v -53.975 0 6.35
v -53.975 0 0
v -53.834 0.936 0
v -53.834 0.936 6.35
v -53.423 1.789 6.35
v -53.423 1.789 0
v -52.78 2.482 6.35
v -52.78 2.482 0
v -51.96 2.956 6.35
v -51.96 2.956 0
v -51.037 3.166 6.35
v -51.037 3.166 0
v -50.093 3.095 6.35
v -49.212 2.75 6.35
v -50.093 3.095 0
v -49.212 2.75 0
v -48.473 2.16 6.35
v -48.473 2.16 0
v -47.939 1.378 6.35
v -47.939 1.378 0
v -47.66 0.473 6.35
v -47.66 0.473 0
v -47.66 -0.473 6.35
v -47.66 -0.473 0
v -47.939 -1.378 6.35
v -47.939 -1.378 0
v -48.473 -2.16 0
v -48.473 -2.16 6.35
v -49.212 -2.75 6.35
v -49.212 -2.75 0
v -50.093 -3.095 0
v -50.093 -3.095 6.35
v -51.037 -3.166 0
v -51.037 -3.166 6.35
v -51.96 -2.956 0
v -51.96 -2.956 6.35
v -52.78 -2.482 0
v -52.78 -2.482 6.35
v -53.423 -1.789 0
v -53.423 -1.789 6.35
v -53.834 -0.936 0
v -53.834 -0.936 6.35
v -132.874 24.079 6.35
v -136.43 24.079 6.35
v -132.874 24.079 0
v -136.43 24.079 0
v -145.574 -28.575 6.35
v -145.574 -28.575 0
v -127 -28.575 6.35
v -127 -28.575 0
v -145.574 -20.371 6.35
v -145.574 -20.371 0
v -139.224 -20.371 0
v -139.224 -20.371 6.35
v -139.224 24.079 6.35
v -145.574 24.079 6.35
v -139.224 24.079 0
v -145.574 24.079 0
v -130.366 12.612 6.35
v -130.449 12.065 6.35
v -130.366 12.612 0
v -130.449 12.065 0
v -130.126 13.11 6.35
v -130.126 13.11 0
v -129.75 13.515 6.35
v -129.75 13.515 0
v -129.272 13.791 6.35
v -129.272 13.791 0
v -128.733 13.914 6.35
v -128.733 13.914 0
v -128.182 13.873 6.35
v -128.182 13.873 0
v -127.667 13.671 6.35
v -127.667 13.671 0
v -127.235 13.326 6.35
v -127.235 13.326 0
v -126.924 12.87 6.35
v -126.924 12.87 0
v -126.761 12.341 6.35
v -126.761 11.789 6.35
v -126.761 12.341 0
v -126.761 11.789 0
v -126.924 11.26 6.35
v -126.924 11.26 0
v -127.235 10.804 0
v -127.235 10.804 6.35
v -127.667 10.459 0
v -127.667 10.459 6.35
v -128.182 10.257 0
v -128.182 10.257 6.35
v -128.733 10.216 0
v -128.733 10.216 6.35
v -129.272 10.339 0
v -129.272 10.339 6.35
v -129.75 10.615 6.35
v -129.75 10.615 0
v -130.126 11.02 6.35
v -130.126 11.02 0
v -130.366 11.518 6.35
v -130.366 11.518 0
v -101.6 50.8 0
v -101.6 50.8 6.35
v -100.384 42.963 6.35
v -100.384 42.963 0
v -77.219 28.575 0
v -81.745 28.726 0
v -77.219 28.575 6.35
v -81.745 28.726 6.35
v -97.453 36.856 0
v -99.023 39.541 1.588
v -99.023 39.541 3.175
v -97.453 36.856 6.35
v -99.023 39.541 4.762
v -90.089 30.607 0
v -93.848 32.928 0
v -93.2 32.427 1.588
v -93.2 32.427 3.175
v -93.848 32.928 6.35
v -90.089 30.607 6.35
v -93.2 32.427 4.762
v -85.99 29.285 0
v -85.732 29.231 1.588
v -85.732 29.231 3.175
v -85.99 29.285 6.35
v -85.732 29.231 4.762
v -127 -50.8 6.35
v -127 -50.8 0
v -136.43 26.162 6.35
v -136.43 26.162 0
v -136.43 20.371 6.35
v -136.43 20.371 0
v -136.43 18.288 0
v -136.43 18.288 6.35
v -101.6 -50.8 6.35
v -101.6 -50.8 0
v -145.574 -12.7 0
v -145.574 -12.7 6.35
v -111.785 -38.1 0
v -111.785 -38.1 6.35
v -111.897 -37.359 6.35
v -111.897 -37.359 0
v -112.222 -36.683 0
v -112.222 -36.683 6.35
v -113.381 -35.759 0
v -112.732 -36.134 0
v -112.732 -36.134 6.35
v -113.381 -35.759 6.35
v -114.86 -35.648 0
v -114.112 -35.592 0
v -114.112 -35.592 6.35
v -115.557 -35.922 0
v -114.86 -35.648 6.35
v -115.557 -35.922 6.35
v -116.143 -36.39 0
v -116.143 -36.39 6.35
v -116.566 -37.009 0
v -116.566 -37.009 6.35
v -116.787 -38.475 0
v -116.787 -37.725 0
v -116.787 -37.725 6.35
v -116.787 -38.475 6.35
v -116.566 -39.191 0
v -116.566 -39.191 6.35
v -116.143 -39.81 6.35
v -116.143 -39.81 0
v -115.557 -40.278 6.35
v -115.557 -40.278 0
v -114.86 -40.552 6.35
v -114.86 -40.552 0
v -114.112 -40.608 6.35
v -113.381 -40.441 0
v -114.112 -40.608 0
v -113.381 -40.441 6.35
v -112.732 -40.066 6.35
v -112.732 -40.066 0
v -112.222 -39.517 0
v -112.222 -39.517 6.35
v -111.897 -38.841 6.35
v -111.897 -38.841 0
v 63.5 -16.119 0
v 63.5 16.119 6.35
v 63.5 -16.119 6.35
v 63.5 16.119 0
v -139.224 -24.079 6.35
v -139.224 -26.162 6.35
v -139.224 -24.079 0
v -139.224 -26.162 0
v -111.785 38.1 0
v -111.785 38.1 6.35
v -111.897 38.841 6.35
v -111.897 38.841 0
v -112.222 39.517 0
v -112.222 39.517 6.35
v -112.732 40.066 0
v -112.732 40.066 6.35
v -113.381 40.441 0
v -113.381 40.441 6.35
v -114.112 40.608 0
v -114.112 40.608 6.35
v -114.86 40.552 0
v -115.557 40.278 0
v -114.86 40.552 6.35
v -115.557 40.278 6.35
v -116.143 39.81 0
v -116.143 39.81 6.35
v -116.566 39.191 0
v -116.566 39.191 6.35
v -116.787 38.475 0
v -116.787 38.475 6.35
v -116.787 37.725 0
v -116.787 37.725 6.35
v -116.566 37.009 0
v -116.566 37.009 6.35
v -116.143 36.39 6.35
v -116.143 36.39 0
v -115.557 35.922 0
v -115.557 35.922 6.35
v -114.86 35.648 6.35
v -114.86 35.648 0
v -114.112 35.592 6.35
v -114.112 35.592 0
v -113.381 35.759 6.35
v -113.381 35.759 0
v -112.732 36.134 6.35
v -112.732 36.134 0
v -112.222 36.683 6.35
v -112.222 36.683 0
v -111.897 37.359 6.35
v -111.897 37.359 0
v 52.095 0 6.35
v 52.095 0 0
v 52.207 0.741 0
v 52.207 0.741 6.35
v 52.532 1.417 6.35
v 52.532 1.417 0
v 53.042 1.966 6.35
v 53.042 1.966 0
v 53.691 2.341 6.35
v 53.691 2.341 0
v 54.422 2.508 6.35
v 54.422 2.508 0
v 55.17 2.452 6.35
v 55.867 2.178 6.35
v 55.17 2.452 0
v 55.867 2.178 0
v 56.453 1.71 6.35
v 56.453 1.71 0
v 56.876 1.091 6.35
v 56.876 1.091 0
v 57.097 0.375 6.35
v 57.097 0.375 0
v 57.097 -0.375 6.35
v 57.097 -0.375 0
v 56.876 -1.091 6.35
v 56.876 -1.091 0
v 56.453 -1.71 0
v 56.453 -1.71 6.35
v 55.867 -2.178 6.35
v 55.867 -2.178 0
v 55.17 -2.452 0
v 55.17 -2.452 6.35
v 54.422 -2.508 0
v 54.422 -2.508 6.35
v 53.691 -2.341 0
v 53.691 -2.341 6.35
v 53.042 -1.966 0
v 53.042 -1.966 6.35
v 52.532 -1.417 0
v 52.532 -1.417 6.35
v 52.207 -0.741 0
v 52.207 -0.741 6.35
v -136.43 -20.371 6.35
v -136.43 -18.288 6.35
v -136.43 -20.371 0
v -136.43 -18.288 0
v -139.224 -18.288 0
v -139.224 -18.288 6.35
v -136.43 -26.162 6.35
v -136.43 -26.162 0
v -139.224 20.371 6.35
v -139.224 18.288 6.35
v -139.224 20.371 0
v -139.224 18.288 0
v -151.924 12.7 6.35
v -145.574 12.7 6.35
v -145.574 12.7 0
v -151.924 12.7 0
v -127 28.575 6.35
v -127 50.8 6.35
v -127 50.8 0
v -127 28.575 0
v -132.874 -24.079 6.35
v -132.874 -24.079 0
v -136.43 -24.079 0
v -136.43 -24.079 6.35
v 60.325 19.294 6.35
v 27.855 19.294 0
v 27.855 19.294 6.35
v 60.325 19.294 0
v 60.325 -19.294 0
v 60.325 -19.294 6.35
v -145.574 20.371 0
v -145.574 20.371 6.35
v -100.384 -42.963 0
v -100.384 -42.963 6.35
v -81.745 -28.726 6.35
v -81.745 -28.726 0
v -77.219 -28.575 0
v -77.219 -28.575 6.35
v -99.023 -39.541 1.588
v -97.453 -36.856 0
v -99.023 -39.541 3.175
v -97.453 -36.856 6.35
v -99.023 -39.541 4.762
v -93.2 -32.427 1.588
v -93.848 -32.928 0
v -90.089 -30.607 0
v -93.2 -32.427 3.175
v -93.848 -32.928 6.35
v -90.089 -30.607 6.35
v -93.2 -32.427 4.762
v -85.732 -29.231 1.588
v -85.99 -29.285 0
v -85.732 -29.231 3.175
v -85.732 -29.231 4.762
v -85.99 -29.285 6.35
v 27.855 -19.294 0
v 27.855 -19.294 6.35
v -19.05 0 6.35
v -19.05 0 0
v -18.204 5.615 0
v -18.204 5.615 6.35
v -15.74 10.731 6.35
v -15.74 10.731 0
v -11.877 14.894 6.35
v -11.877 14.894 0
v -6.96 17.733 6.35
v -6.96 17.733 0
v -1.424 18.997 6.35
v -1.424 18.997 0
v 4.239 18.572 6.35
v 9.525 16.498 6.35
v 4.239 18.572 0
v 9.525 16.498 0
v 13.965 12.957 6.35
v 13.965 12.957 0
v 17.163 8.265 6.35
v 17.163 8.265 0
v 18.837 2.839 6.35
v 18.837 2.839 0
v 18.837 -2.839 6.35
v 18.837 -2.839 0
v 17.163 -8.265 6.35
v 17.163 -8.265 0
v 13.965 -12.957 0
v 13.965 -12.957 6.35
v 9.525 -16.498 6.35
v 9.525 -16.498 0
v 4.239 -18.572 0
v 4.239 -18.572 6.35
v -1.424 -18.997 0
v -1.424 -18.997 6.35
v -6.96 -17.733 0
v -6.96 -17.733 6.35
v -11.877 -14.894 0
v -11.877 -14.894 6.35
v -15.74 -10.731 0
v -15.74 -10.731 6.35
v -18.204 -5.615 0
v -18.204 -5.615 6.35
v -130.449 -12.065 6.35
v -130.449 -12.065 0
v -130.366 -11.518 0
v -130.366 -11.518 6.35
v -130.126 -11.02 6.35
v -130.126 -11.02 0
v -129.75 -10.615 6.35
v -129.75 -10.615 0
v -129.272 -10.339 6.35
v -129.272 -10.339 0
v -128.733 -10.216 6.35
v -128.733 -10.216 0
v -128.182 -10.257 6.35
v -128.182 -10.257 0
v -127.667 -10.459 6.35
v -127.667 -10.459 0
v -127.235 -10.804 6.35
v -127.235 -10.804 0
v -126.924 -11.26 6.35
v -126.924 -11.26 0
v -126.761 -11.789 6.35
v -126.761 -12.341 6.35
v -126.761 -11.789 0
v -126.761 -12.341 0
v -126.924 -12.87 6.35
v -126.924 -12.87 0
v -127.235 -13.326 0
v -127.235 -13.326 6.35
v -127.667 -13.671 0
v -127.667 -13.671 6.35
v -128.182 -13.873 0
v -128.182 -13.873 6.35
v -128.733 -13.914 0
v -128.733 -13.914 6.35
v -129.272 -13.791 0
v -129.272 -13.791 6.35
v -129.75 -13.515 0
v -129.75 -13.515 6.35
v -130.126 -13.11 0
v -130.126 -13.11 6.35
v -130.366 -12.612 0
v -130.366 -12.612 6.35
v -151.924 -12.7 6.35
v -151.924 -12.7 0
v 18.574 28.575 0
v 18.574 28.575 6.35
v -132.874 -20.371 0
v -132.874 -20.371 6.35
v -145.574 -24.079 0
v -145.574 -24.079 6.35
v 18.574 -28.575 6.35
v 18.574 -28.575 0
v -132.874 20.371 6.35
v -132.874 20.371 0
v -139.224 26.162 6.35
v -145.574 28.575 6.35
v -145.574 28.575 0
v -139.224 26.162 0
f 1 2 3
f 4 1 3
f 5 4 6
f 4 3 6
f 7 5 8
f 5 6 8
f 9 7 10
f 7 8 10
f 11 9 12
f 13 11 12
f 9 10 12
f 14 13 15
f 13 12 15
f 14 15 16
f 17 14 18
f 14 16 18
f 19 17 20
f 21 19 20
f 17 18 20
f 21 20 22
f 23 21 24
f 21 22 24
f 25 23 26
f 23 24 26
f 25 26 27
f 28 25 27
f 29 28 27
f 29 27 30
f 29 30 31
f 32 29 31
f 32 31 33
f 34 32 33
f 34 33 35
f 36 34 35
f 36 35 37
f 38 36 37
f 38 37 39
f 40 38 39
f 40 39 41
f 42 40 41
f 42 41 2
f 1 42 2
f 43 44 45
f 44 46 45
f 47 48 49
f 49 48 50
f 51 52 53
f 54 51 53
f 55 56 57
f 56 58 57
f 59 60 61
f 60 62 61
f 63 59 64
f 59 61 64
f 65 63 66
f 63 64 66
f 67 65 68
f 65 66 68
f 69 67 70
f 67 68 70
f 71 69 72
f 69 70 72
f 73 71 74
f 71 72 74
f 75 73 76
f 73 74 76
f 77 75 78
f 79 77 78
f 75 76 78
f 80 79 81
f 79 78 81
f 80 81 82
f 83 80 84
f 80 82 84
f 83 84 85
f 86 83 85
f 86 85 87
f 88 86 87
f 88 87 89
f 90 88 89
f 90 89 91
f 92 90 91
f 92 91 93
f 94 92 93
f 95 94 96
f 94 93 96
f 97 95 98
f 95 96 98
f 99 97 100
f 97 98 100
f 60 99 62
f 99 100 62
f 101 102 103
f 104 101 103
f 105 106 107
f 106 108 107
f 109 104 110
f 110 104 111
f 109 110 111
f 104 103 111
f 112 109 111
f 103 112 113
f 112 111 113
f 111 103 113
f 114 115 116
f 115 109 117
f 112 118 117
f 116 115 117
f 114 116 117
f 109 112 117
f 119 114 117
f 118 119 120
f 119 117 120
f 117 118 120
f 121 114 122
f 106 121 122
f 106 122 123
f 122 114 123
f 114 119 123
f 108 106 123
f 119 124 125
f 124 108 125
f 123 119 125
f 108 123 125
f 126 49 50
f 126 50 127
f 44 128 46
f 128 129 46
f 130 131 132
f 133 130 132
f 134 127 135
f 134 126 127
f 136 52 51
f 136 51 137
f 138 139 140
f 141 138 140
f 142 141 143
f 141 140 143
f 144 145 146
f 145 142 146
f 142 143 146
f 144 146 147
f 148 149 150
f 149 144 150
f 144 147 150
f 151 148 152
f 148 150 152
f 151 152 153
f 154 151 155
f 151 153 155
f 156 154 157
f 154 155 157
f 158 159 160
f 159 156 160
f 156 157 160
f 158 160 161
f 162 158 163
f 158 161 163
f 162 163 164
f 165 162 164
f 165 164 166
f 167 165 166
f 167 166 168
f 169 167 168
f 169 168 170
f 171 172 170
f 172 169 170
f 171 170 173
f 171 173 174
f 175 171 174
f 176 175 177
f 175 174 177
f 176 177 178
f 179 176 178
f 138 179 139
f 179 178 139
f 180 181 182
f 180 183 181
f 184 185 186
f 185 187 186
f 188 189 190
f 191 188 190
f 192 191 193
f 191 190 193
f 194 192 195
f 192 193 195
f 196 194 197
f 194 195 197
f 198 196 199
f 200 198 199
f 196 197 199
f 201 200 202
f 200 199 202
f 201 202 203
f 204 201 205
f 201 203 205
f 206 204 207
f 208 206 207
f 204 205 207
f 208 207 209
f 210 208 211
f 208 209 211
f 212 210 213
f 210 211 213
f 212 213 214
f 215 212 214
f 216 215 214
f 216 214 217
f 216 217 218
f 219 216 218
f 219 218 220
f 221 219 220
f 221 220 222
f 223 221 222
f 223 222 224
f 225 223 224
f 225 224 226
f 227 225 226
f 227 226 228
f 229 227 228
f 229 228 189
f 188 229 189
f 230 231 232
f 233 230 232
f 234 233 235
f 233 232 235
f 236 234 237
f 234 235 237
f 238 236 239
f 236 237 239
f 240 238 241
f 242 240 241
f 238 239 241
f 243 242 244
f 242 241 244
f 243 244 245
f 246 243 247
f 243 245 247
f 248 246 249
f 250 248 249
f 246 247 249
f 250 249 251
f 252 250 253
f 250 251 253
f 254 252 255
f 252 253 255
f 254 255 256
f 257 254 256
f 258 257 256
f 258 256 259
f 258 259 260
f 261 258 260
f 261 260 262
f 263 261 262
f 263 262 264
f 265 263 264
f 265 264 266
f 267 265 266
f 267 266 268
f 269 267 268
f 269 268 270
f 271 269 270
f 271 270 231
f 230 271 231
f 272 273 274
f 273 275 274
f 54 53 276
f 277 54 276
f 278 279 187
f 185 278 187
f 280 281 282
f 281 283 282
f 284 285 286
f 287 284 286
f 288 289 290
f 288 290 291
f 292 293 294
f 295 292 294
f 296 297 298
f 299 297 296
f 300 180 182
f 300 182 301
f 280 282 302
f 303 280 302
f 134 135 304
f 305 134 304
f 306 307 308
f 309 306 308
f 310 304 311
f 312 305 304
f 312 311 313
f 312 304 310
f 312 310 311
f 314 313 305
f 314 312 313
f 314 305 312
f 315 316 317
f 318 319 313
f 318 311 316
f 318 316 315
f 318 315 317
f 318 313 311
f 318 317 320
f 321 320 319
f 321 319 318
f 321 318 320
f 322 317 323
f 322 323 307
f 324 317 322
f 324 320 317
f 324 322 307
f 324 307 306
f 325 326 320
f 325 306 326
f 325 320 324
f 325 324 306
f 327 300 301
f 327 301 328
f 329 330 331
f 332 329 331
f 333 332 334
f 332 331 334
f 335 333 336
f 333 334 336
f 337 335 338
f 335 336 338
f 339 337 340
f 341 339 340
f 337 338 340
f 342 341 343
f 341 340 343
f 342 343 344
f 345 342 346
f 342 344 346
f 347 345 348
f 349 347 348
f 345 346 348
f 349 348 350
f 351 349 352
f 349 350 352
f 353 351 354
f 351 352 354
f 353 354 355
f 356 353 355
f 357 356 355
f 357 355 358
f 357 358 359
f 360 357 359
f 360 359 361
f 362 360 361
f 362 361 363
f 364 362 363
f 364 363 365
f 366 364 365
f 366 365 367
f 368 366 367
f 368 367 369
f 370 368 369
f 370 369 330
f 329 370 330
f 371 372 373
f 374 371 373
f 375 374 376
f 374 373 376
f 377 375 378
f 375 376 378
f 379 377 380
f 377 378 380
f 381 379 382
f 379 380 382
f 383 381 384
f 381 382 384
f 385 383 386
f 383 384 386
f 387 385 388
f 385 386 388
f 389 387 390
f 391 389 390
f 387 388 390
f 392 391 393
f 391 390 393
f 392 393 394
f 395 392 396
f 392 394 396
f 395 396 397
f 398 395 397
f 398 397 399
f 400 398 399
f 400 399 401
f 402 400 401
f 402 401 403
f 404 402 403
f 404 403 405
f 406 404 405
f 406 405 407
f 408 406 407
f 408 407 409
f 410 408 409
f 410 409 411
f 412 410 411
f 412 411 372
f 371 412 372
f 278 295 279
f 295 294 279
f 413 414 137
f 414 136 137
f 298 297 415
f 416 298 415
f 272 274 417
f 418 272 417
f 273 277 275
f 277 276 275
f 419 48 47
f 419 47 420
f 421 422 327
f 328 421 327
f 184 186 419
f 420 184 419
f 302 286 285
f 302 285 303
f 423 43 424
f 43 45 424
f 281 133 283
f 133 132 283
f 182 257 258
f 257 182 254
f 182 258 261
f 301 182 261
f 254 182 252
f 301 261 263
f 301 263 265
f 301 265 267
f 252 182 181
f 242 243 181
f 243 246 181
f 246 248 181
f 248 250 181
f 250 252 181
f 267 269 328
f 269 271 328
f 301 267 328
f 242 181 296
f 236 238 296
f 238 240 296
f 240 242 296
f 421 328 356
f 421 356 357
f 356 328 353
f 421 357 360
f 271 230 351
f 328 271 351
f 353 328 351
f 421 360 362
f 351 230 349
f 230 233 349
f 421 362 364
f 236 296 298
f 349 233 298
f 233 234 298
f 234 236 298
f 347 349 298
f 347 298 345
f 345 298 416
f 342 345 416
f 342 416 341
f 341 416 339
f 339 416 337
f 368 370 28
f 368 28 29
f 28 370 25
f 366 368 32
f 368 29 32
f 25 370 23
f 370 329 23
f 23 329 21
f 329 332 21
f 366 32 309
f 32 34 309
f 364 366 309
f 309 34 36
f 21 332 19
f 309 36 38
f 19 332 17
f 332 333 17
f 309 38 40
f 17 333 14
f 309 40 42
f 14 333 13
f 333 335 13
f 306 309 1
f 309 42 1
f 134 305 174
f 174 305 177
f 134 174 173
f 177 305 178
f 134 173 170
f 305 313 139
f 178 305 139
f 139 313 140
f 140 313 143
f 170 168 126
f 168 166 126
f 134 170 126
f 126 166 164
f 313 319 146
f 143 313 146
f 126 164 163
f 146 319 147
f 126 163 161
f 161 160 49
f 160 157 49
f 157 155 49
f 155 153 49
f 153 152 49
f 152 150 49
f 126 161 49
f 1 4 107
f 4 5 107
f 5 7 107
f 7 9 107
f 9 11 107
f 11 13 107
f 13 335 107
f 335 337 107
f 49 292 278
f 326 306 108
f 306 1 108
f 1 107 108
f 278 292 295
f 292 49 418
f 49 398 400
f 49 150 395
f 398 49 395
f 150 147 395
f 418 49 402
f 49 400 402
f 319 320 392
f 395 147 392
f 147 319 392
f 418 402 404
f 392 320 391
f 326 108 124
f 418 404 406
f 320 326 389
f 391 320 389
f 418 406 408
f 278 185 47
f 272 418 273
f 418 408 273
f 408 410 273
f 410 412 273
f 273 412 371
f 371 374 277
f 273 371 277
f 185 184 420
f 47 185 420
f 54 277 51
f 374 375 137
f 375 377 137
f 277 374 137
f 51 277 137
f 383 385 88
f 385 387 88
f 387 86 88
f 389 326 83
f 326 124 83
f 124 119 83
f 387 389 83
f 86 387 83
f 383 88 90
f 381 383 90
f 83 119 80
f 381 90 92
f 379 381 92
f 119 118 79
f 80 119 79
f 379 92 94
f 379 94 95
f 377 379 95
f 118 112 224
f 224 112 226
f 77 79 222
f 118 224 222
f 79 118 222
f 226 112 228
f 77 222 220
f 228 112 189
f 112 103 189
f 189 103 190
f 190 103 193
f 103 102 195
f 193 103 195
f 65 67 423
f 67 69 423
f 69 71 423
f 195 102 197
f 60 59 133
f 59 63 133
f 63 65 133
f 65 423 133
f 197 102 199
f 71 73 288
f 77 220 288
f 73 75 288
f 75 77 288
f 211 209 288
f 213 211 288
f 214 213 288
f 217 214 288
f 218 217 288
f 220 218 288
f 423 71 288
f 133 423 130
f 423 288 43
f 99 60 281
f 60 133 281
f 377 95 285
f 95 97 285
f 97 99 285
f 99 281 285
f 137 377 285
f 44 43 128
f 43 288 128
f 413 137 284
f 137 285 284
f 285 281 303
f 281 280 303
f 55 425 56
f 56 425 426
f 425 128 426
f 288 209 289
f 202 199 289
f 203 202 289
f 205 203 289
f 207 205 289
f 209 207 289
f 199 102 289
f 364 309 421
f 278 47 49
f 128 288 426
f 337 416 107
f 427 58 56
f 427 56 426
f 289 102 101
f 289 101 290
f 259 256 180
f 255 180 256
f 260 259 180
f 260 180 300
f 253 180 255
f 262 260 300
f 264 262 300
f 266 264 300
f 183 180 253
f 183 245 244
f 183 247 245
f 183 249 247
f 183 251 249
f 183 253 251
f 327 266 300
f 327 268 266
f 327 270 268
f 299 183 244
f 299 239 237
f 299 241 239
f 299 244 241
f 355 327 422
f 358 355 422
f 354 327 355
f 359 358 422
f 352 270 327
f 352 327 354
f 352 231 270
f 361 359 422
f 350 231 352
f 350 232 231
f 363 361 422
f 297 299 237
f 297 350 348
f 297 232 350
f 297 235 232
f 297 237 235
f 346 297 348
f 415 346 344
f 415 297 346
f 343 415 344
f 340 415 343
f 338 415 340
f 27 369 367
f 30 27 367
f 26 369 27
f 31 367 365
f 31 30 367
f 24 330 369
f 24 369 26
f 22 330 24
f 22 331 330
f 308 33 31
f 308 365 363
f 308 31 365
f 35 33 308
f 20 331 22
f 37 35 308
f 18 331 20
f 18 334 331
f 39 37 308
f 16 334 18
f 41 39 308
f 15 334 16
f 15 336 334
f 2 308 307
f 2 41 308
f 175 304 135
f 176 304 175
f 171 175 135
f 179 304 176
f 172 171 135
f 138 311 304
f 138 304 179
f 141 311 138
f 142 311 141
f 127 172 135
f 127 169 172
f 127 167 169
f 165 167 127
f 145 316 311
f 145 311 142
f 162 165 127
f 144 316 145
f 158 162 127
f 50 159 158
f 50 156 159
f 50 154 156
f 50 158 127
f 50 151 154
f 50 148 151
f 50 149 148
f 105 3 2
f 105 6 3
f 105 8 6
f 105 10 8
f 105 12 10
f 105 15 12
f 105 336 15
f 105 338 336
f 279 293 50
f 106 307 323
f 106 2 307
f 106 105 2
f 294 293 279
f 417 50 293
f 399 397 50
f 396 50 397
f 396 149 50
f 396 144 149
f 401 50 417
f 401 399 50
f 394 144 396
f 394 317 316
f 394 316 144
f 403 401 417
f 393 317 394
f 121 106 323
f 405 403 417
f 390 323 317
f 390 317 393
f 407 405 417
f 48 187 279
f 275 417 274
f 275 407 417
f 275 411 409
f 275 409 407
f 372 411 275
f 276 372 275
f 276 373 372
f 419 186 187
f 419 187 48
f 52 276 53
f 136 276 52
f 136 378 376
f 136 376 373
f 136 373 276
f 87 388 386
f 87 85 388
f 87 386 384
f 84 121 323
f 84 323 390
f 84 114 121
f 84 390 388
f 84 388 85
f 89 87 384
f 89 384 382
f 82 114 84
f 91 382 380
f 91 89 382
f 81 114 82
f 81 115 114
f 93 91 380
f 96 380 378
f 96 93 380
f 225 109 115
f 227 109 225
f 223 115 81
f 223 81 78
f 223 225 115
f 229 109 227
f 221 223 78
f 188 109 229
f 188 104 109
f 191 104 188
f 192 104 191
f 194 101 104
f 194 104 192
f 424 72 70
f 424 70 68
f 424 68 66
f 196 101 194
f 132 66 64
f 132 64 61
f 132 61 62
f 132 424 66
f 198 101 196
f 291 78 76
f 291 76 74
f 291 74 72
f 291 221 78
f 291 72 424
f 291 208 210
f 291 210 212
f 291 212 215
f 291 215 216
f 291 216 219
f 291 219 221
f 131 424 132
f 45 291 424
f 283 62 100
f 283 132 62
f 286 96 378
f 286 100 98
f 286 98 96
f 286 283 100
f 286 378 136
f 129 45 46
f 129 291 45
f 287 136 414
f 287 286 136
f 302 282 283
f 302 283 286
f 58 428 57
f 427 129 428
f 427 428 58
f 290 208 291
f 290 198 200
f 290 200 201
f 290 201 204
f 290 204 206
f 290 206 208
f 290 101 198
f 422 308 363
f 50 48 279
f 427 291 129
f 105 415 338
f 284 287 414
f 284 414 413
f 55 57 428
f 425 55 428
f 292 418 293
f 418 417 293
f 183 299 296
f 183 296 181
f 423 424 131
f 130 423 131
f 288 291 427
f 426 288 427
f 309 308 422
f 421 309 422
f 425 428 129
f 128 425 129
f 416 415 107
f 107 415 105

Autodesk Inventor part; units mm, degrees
ref_plane "YZ Plane" through (0, 0, 0) normal (1, 0, 0) x (0, 1, 0)
ref_plane "XZ Plane" through (0, 0, 0) normal (0, 1, 0) x (-1, 0, 0)
ref_plane "XY Plane" through (0, 0, 0) normal (0, 0, 1) x (1, 0, 0)
sketch "Sketch1" plane through (0, 0, 0) normal (0, 0, 1) x (1, 0, 0)
  line L0 (-21.15, 15.4985) -> (-15.4985, 21.15)
  line L1 (-15.4985, 21.15) -> (15.4985, 21.15)
  line L2 (15.4985, 21.15) -> (21.15, 15.4985)
  line L3 (21.15, 15.4985) -> (21.15, -15.4985)
  line L4 (21.15, -15.4985) -> (15.4985, -21.15)
  line L5 (15.4985, -21.15) -> (-15.4985, -21.15)
  line L6 (-15.4985, -21.15) -> (-21.15, -15.4985)
  line L7 (-21.15, -15.4985) -> (-21.15, 15.4985)
  line L8 (28.575, -18.574) -> (28.575, 18.574)
  line L9 (28.575, 18.574) -> (18.574, 28.575)
  line L10 (18.574, 28.575) -> (-18.574, 28.575)
  line L11 (-18.574, 28.575) -> (-28.575, 18.574)
  line L12 (-28.575, 18.574) -> (-28.575, -18.574)
  line L13 (-28.575, -18.574) -> (-18.574, -28.575)
  line L14 (-18.574, -28.575) -> (18.574, -28.575)
  line L15 (18.574, -28.575) -> (28.575, -18.574)
  line L16 (-18.574, -28.575) -> (-145.574, -28.575)
  line L17 (-145.574, -28.575) -> (-145.574, 28.575)
  line L18 (-145.574, 28.575) -> (-18.574, 28.575)
  line L19 (-18.574, 28.575) -> (-18.574, -28.575)
  circle A0 centre (0, 0) radius 11
  point P0 (0, 0)
  dimension "d0" = 127
  dimension "d1" = 57.15
  dimension "d2" = 57.15
extrude "Extrusion1" add sketch "Sketch1" along normal blind 6.35 contours L7 L6 L19 L13 L12 L11 L0 | L0 L19 L6 L7 | L19 L10 L9 L8 L15 L14 L6 L5 L4 L3 L2 L1 L0 | L0 L1 L2 L3 L4 L5 L6 L19 | L11 L12 L13 L16 L17 L18 | A0
sketch "Sketch2" plane through (0, 0, 0) normal (0, 0, -1) x (-1, 0, 0)
  line L0 (130.4486, -16.3493) -> (130.4486, -9.9993) projected
  line L1 (126.7402, -9.9993) -> (126.7402, -16.3493) projected
  line L2 (130.4486, 9.0507) -> (130.4486, 15.4007) projected
  line L3 (126.7402, 15.4007) -> (126.7402, 9.0507) projected
  line L4 (126.7402, -12.7) -> (130.4486, -12.7) construction
  line L5 (126.7402, 12.7) -> (130.4486, 12.7) construction
  circle A0 centre (128.5944, -12.065) radius 1.8542
  circle A1 centre (128.5944, 12.065) radius 1.8542
  line L6 (-18.574, 28.575) -> (145.574, 28.575) projected
  line L7 (145.574, -28.575) -> (-18.574, -28.575) projected
  line L8 (242.583, -12.065) -> (-73.768, -12.065)
  dimension "d5" = 3.7084
  dimension "d6" = 3.7084
  dimension "d13" = 16.51
  dimension "d14" = 16.51
  dimension "d15" = 16.51
extrude "Extrusion2" cut sketch "Sketch2" against normal through all
sketch "Sketch3" plane through (0, 0, 0) normal (0, 0, -1) x (-1, 0, 0)
  line L0 (145.574, 28.575) -> (145.574, -28.575) projected
  line L1 (139.224, -24.0792) -> (145.574, -24.0792) projected
  line L2 (145.574, -28.575) -> (145.574, -24.0792) projected
  line L3 (-18.574, -28.575) -> (145.574, -28.575) projected
  line L4 (-28.575, -18.574) -> (-18.574, -28.575) projected
  line L5 (-28.575, 18.574) -> (-28.575, -18.574) projected
  line L6 (-18.574, 28.575) -> (-28.575, 18.574) projected
  line L7 (145.574, 28.575) -> (-18.574, 28.575) projected
  line L8 (145.574, 24.0792) -> (145.574, 28.575) projected
  line L9 (145.574, 24.0792) -> (139.224, 24.0792) projected
  line L10 (139.224, 24.0792) -> (139.224, 26.162) projected
  line L11 (139.224, 26.162) -> (136.43, 26.162) projected
  line L12 (136.43, 26.162) -> (136.43, 24.0792) projected
  line L13 (136.43, 24.0792) -> (132.874, 24.0792) projected
  line L14 (132.874, 24.0792) -> (132.874, 20.3708) projected
  line L15 (132.874, 20.3708) -> (136.43, 20.3708) projected
  line L16 (136.43, 20.3708) -> (136.43, 18.288) projected
  line L17 (136.43, 18.288) -> (139.224, 18.288) projected
  line L18 (139.224, 18.288) -> (139.224, 20.3708) projected
  line L19 (139.224, 20.3708) -> (145.574, 20.3708) projected
  line L20 (145.574, -20.3708) -> (145.574, 20.3708) projected
  line L21 (145.574, -20.3708) -> (139.224, -20.3708) projected
  line L22 (139.224, -20.3708) -> (139.224, -18.288) projected
  line L23 (139.224, -18.288) -> (136.43, -18.288) projected
  line L24 (136.43, -18.288) -> (136.43, -20.3708) projected
  line L25 (136.43, -20.3708) -> (132.874, -20.3708) projected
  line L26 (132.874, -20.3708) -> (132.874, -24.0792) projected
  line L27 (132.874, -24.0792) -> (136.43, -24.0792) projected
  line L28 (136.43, -24.0792) -> (136.43, -26.162) projected
  line L29 (136.43, -26.162) -> (139.224, -26.162) projected
  line L30 (139.224, -26.162) -> (139.224, -24.0792) projected
  circle A0 centre (128.5944, 12.7) radius 1.8542 projected
  circle A1 centre (128.5944, -12.7) radius 1.8542 projected
  circle A2 centre (-15.5, -15.5) radius 2 projected
  circle A3 centre (15.5, -15.5) radius 2 projected
  circle A4 centre (-15.5, 15.5) radius 2 projected
  circle A5 centre (15.5, 15.5) radius 2 projected
  circle A6 centre (0, 0) radius 11 projected
extrude "Extrusion3" cut sketch "Sketch3" against normal through all contours L0 L19 L18 L17 L16 L15 L14 L13 L12 L11 L10 L9 | L0 L1 L30 L29 L28 L27 L26 L25 L24 L23 L22 L21
sketch "Sketch4" plane through (0, 0, 0) normal (0, 0, -1) x (-1, 0, 0)
  circle A0 centre (0, 0) radius 11 projected
  circle A1 centre (0, 0) radius 19.05 projected
  point P0 (0, 0)
  dimension "d24" = 38.1
  dimension "d25" = 22
extrude "Extrusion4" cut sketch "Sketch4" against normal through all contours A0 | A1
sketch "Sketch5" plane through (-145.574, -20.3708, 0) normal (-1, 0, 0) x (0, 0, 1)
  line L0 (0, 40.7416) -> (0, 0) projected
  line L1 (0, 33.0708) -> (0, 7.6708) projected
  line L2 (0, 7.6708) -> (6.35, 7.6708) projected
  line L3 (6.35, 7.6708) -> (6.35, 33.0708) projected
  line L4 (6.35, 33.0708) -> (0, 33.0708) projected
  point P0 (0, 20.3708)
extrude "Extrusion5" add sketch "Sketch5" along normal blind 6.35
sketch "Sketch6" plane through (0, 0, 6.35) normal (0, 0, 1) x (1, 0, 0)
  line L0 (-145.574, 28.575) -> (18.574, 28.575) projected
  circle A0 centre (-114.3, 38.1) radius 2.5146 projected
  circle A1 centre (-114.3, -38.1) radius 2.5146 projected
  line L1 (0, 50.8) -> (-127, 50.8) projected
  line L2 (-127, 50.8) -> (-127, -50.8) projected
  line L3 (-127, -50.8) -> (0, -50.8) projected
  line L4 (-127, 50.8) -> (-101.6, 50.8)
  line L5 (-101.6, 28.575) -> (-127, 28.575)
  line L6 (-127, 28.575) -> (-127, 50.8)
  spline S0 degree 4 poles (-101.6, 50.8) (-101.4278, 37.6809) (-93.5766, 28.9843) (-86.3032, 28.7086) (-77.2189, 28.575) knots 0 0 0 0 0 1 1 1 1 1
  line L7 (-101.6678, 55.9666) -> (-101.5322, 45.6334) construction
  arc A2 (-101.3699, 54.8975) -> (-101.2624, 46.71) centre (-71.935, 51.1893) ccw construction
  line L8 (-81.6682, 28.6405) -> (-72.7695, 28.5095) construction
  arc A3 (-80.7781, 28.6371) -> (-73.6593, 28.5323) centre (-67.6175, 681.2105) ccw construction
  line L9 (-151.924, 0) -> (28.575, 0) construction
  line L10 (0, -50.8) -> (-127, -50.8)
  line L11 (-101.6, -50.8) -> (-101.6, -28.575)
  line L12 (-127, -28.575) -> (-127, -50.8)
  spline S1 degree 4 poles (-101.6, -50.8) (-101.4278, -37.6809) (-93.5766, -28.9843) (-86.3032, -28.7086) (-77.2189, -28.575) knots 0 0 0 0 0 1 1 1 1 1
  line L13 (-101.6678, -55.9666) -> (-101.5322, -45.6334) construction
  arc A4 (-101.2624, -46.71) -> (-101.3699, -54.8975) centre (-71.935, -51.1893) ccw construction
  line L14 (-81.6682, -28.6405) -> (-72.7695, -28.5095) construction
  arc A5 (-73.6593, -28.5323) -> (-80.7781, -28.6371) centre (-67.6175, -681.2105) ccw construction
  line L15 (-77.2189, 28.575) -> (-101.6, 28.5129)
  point P0 (-91.9655, 31.5993)
  point P1 (-91.9655, -31.5993)
extrude "Extrusion6" add sketch "Sketch6" against normal blind 6.35 contours L2 L1 S0 L0
ref_plane "Work Plane1" through (-145.574, 0, 0) normal (0, -1, 0) x (1, 0, 0)
mirror "Mirror1" about plane through (-145.574, 0, 0) normal (0, -1, 0) of "Extrusion6"
sketch "Sketch7" plane through (0, 0, 0) normal (0, 0, -1) x (-1, 0, 0)
  line L0 (-28.575, 18.574) -> (-18.574, 28.575)
  line L1 (-18.574, -28.575) -> (-28.575, -18.574)
  line L2 (-28.575, -18.574) -> (-28.575, 18.574)
  line L3 (-60.325, -19.2943) -> (-48.1038, -19.2943)
  line L4 (-63.5, -16.1193) -> (-60.325, -19.2943)
  line L5 (-63.5, 16.1193) -> (-63.5, -16.1193)
  line L6 (-60.325, 19.2943) -> (-63.5, 16.1193)
  line L7 (-48.1038, 19.2943) -> (-60.325, 19.2943)
  line L8 (-48.1038, 19.2943) -> (-27.8548, 19.2943)
  line L9 (-48.1038, -19.2943) -> (-27.8548, -19.2943)
  circle A0 centre (-54.61, 0) radius 2.5146
extrude "Extrusion7" add sketch "Sketch7" against normal blind 6.35
sketch "Sketch8" plane through (0, 0, 0) normal (0, 0, -1) x (-1, 0, 0)
  circle A0 centre (50.8, 0) radius 3.175 projected
extrude "Extrusion8" cut sketch "Sketch8" against normal through all
equation "\"d2\" = d1"
equation "\"d14\" = d13"
equation "\"d15\" = d14"
properties part number "tiltColumnStepperSide02_RB01" material "Gold"
